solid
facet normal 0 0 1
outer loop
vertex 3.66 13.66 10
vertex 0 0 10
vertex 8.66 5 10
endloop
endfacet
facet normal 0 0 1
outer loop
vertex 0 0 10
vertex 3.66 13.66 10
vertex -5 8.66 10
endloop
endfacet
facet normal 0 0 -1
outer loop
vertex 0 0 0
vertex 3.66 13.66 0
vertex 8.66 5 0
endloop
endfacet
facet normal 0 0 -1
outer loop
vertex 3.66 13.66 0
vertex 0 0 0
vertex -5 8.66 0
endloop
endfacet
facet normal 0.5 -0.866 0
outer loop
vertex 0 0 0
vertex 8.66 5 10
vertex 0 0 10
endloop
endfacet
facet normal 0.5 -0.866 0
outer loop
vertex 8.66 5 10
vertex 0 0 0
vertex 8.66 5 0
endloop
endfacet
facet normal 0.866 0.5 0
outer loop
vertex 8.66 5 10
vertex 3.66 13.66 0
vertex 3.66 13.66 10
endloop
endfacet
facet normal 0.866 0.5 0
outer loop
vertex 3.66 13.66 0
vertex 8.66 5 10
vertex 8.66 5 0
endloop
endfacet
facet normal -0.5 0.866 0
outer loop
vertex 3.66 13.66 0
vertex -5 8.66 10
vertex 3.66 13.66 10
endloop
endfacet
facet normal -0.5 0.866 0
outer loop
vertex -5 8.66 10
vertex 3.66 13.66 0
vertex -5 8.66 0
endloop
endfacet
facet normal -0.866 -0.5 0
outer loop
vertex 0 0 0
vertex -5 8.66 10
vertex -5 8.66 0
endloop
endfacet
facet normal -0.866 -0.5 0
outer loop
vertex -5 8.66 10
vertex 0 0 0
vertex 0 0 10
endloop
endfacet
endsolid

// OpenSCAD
// Generated by scadwright. Do not hand-edit —
// edit the Python source and regenerate.

rotate(a=30, v=[0, 0, 1]) {
    cube([10, 10, 10], center=false);
}
